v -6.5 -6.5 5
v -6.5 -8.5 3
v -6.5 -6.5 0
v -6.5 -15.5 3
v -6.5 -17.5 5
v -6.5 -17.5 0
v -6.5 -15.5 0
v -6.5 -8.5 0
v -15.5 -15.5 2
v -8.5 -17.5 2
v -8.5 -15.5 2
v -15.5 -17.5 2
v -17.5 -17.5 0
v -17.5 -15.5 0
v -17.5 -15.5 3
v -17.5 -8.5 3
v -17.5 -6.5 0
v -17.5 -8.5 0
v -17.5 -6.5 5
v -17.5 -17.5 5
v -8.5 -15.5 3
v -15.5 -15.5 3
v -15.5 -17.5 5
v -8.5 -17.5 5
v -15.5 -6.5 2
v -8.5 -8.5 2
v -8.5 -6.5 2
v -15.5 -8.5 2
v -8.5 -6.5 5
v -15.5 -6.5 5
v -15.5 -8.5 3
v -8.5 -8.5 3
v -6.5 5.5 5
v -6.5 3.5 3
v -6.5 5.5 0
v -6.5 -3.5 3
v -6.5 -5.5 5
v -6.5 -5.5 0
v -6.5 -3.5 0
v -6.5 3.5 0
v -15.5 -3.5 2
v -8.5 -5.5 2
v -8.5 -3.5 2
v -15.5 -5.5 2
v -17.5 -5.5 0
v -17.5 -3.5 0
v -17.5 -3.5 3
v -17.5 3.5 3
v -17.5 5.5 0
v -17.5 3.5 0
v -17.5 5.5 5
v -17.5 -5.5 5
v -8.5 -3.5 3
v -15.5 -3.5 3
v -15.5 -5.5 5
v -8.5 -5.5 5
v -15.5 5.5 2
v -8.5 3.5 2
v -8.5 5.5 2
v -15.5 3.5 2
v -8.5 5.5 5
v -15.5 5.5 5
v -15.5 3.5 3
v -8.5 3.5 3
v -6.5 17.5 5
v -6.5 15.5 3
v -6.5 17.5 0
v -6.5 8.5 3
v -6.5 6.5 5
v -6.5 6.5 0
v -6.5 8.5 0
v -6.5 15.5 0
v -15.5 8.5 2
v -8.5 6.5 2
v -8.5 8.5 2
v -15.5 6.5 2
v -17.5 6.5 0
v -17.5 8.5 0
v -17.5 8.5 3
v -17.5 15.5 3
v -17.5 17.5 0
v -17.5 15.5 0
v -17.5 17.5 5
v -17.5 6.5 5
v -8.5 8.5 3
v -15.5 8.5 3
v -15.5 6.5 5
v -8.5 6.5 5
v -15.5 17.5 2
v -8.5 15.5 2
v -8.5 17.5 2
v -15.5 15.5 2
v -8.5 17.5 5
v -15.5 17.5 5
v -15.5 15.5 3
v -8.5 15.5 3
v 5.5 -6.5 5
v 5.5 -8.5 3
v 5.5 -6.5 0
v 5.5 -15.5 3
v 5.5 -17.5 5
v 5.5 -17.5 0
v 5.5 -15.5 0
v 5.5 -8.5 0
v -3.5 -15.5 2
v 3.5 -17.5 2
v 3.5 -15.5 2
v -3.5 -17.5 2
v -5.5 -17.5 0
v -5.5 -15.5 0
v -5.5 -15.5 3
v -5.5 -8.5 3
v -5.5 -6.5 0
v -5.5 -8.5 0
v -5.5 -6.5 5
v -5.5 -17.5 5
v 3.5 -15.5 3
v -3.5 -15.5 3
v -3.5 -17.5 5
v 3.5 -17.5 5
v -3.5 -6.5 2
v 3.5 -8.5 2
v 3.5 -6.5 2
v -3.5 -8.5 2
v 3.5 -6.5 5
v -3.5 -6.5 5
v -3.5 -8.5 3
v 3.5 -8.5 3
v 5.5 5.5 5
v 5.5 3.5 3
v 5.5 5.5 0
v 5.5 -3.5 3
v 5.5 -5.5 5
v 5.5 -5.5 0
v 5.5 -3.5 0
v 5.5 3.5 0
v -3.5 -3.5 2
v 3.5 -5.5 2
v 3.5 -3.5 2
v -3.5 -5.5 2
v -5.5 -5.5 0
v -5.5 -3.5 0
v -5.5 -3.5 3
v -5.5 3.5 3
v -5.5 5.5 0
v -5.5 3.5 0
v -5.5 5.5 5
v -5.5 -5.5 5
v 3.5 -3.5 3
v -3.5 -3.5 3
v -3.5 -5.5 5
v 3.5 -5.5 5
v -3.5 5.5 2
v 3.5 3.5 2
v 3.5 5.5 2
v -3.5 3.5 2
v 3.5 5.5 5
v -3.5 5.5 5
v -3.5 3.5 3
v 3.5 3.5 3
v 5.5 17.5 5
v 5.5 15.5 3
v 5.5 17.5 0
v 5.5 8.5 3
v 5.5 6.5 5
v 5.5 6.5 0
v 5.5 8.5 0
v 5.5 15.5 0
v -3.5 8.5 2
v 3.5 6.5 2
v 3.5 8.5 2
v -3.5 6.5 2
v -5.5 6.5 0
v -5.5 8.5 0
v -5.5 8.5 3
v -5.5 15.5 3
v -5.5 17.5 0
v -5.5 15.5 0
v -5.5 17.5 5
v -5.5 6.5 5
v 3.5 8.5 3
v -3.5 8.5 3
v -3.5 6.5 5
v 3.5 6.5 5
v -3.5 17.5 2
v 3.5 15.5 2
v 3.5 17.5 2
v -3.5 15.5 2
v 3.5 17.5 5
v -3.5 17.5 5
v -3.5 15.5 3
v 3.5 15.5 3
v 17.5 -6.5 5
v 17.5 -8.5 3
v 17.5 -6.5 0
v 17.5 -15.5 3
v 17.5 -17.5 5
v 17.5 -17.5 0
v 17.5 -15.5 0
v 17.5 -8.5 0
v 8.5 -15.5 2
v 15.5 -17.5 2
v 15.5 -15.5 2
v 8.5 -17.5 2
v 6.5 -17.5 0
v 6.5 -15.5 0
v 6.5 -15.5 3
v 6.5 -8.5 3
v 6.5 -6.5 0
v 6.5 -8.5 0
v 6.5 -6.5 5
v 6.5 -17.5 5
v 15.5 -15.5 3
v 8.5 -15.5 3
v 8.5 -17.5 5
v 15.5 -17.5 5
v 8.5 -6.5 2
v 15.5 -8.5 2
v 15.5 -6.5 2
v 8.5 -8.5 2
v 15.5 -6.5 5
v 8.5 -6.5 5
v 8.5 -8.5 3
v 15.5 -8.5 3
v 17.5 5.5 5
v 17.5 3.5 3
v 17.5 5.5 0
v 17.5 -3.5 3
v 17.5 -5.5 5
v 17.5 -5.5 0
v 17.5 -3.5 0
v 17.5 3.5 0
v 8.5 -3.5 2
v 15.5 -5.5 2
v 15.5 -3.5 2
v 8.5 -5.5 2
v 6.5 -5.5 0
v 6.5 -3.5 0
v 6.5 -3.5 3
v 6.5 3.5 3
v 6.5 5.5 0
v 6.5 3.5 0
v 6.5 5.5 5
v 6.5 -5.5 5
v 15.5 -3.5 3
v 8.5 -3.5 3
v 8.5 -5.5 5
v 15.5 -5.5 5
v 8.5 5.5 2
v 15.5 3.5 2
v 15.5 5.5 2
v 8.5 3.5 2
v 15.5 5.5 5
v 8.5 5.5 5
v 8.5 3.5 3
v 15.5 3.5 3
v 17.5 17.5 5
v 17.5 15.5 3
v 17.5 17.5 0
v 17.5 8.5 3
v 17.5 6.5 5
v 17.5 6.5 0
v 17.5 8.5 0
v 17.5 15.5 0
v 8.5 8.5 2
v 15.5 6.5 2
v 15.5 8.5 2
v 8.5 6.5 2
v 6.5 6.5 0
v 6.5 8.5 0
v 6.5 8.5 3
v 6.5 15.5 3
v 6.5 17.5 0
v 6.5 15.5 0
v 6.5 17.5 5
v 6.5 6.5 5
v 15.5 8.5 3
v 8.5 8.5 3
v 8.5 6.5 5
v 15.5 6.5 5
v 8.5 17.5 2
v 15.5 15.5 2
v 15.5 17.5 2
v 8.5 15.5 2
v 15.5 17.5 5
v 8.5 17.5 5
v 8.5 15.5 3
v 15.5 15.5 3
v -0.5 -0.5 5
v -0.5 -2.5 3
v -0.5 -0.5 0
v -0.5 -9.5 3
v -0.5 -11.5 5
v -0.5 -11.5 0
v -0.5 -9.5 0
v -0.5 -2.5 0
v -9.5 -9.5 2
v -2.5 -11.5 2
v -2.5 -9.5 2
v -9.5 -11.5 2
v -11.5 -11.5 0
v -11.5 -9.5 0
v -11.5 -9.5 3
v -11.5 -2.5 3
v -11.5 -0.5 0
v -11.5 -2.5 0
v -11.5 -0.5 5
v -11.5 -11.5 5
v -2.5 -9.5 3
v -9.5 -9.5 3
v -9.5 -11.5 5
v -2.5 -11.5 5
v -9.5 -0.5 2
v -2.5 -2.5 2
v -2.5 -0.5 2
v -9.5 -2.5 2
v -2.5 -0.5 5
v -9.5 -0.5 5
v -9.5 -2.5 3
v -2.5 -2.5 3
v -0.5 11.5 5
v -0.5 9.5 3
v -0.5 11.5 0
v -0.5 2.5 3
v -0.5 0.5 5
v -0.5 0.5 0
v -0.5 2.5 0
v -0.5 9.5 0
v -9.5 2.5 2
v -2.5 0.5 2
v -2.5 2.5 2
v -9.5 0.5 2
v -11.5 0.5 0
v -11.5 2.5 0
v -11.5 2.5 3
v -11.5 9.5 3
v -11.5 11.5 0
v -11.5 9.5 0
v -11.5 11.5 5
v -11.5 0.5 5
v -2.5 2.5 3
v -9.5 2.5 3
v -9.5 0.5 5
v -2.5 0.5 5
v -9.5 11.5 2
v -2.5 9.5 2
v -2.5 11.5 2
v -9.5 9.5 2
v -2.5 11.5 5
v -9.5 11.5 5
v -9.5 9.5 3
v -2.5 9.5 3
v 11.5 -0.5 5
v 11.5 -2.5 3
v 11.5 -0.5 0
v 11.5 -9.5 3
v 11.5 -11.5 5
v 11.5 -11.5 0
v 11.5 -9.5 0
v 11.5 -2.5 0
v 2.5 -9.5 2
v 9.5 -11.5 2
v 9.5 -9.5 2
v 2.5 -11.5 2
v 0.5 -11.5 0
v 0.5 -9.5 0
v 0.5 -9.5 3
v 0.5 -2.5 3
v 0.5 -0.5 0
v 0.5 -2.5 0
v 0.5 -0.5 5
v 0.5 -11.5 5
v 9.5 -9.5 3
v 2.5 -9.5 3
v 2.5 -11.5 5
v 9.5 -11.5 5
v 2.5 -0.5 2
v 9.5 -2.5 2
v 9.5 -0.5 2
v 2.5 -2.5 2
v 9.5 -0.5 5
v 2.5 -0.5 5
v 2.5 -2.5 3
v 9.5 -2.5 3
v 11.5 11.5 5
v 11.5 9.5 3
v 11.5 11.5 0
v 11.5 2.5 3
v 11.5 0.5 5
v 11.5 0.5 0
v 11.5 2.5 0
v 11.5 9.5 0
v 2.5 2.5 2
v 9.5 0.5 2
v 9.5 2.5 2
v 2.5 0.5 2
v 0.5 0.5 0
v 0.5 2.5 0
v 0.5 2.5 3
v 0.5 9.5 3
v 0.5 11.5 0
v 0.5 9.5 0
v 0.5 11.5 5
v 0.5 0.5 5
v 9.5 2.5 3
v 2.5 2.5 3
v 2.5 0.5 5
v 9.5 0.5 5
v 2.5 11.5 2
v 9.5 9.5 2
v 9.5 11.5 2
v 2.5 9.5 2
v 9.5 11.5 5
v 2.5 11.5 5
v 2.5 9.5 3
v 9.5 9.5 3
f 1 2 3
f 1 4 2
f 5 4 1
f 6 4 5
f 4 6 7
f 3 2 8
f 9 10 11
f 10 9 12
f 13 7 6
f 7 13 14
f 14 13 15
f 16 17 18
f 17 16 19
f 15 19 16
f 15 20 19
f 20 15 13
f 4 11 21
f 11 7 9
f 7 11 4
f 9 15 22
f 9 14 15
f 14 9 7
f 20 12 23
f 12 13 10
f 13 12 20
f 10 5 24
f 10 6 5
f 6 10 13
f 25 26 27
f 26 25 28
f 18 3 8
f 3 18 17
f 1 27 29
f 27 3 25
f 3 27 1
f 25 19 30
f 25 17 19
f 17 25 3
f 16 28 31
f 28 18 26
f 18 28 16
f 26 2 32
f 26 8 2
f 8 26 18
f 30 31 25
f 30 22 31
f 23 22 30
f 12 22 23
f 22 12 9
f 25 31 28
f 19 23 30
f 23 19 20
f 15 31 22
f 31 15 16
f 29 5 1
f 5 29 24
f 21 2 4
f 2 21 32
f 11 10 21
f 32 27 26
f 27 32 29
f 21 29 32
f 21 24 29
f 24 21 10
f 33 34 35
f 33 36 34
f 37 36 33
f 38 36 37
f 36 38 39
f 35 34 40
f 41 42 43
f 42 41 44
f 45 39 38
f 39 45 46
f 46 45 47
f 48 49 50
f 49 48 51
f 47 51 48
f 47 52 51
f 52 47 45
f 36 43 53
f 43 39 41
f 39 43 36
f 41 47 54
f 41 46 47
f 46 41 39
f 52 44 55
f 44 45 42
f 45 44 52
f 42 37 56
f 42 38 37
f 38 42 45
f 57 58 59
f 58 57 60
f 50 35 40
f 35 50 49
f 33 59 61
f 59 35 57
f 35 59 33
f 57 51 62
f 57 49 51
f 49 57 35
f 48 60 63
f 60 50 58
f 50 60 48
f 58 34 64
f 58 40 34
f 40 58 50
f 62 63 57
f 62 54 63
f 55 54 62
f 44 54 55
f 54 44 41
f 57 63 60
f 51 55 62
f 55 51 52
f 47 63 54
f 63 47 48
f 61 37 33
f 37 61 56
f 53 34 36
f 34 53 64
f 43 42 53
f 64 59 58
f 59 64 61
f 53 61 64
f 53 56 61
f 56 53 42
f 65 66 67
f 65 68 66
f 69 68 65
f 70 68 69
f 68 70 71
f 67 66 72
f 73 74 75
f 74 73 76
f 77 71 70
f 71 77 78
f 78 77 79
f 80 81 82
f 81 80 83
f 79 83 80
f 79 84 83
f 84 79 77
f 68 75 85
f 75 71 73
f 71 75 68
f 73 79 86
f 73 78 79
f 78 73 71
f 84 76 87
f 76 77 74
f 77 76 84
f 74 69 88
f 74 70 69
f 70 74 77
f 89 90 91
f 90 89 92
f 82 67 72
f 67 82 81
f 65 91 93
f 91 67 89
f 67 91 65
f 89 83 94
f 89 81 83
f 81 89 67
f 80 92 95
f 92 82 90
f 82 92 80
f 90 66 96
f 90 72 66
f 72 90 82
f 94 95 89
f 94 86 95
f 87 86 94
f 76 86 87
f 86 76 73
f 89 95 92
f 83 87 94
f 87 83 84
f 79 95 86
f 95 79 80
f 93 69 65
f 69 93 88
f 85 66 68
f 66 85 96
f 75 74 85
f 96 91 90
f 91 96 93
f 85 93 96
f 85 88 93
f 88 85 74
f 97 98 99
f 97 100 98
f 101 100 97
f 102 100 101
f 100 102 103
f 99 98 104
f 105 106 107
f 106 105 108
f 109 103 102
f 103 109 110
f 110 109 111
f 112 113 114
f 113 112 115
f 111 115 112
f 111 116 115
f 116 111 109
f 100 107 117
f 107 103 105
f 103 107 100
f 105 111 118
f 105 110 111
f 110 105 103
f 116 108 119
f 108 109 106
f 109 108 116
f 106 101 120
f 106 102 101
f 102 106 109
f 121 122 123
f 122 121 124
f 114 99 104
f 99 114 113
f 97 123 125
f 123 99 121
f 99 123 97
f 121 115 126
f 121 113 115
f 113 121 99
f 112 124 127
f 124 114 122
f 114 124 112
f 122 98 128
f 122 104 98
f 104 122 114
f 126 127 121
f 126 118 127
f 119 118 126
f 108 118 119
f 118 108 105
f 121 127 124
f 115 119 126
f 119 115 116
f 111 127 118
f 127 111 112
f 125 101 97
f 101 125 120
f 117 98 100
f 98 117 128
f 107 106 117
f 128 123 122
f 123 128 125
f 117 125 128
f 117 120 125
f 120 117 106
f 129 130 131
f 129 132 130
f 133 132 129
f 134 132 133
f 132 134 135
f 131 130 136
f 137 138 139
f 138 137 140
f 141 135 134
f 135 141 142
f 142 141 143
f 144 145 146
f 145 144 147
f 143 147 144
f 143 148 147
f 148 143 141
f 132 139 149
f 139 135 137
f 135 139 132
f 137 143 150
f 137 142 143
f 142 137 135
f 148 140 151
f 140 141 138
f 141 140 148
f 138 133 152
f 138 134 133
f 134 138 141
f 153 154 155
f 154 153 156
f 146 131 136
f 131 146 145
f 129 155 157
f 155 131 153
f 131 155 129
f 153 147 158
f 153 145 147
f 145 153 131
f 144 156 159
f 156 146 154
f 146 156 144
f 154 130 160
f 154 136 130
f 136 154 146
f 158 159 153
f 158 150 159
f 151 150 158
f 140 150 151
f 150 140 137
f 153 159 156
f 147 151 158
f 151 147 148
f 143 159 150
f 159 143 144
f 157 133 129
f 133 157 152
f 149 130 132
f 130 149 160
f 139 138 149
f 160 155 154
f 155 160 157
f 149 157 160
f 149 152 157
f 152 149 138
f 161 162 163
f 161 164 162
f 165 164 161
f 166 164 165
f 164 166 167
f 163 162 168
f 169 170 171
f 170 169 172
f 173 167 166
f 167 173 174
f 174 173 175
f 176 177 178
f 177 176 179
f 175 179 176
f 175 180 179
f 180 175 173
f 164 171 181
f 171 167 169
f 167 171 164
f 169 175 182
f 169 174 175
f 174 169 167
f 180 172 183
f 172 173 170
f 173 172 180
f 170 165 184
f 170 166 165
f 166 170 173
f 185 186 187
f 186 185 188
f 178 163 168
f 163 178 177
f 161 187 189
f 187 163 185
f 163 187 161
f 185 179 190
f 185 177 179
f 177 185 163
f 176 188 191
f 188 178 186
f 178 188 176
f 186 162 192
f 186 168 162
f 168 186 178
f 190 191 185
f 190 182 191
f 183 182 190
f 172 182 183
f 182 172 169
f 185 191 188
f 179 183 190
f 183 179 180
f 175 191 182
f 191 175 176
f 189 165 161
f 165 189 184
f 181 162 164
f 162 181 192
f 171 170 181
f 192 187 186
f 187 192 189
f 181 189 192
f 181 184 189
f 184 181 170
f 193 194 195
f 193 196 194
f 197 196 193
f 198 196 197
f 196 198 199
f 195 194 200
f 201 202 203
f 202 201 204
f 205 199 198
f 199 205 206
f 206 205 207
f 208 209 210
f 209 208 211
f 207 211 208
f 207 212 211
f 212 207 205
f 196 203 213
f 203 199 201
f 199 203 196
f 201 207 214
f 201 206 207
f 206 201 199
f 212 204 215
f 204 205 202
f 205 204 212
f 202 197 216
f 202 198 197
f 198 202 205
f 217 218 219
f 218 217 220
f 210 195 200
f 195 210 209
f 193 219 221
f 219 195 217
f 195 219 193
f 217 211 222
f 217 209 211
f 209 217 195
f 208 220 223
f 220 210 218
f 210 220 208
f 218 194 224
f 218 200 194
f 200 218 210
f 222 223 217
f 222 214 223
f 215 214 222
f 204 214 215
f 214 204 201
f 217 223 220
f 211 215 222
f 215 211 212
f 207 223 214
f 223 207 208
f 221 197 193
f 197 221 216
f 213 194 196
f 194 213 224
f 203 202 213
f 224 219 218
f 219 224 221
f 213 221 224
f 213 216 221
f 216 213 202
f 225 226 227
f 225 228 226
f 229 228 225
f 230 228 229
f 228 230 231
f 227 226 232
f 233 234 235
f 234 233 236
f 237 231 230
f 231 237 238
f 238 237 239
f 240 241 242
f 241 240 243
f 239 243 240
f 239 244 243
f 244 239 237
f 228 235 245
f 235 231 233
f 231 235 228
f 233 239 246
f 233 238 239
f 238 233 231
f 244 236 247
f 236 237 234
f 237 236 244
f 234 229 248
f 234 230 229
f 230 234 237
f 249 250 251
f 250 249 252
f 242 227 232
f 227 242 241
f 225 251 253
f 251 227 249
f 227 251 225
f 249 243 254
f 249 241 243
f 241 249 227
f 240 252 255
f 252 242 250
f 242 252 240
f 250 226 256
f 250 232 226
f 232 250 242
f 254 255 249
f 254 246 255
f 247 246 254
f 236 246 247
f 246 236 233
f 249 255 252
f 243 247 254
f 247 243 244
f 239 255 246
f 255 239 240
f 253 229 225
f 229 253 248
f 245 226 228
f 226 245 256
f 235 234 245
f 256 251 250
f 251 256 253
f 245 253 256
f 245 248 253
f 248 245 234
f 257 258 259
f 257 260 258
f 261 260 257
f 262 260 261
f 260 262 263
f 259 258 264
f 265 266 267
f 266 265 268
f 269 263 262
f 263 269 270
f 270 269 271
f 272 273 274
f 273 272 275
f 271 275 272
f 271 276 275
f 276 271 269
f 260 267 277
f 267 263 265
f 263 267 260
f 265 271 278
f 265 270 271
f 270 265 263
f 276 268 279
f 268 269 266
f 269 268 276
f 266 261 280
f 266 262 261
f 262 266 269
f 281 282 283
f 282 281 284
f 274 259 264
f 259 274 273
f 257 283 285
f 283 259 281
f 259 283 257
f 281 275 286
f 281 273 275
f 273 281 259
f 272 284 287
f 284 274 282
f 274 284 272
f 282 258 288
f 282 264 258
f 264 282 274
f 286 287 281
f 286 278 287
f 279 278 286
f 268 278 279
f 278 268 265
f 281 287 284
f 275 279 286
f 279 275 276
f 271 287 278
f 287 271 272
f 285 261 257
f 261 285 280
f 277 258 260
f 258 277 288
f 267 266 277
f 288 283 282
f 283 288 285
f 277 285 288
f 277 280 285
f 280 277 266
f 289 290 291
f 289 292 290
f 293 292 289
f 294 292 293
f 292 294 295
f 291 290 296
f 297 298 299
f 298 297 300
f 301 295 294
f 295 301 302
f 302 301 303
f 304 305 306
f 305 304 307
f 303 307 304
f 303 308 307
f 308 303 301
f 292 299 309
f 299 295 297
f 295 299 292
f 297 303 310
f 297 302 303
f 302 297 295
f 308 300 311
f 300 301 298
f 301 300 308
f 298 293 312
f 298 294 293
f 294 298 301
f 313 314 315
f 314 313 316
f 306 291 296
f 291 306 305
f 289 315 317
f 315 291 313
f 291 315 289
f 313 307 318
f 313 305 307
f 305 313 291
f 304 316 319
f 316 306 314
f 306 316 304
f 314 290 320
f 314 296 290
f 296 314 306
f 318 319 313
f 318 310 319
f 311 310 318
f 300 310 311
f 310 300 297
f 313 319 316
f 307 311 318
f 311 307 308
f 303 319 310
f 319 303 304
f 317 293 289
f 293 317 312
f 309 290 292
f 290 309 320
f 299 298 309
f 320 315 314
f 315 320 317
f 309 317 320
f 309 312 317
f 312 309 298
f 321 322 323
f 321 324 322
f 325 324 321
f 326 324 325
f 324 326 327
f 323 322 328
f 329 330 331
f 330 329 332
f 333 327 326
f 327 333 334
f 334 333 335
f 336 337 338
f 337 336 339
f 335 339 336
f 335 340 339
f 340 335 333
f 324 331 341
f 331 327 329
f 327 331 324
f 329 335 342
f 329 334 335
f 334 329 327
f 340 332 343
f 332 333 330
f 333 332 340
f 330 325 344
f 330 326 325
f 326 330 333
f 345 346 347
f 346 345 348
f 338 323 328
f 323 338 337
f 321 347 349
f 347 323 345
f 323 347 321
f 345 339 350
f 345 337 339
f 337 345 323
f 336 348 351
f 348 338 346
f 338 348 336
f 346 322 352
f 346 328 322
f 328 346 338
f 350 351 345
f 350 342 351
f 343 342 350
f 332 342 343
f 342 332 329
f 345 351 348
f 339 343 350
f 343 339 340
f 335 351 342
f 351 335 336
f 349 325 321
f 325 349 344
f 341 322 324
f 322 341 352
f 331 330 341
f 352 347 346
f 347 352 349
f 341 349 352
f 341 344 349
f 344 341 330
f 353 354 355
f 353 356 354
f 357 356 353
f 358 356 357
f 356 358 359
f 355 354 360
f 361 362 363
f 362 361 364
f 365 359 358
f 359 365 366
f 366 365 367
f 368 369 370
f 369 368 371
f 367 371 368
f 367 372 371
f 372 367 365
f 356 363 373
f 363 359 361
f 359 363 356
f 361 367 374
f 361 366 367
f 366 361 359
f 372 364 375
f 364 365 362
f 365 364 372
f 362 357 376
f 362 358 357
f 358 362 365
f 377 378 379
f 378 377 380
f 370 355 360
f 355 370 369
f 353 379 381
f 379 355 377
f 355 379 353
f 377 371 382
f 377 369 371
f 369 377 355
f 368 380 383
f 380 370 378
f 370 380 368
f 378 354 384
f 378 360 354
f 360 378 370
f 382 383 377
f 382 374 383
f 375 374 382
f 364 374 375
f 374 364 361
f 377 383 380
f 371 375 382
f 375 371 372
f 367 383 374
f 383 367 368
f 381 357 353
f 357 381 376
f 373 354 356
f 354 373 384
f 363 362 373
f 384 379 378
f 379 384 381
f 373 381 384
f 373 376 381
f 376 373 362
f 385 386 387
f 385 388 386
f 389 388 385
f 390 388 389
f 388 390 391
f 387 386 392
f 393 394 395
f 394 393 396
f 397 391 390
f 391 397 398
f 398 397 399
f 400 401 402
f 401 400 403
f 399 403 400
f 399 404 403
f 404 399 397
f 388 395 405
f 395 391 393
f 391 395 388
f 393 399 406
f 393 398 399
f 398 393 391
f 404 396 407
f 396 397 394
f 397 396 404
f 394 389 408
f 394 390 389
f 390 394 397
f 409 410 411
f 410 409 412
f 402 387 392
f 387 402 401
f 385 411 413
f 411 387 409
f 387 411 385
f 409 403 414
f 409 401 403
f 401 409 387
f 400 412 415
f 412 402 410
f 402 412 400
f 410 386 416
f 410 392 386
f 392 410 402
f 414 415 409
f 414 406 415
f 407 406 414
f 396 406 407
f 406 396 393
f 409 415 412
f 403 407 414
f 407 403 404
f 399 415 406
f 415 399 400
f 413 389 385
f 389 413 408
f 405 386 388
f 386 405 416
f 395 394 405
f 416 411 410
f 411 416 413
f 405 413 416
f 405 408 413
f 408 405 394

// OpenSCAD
$fn = 128;

module link(width, margin) {
    total_length = 4*width+3*margin;
    total_height = 2*width+margin;
    shift_length = 3*width+3*margin;
    shift_height = width+margin;
    union() {
        for (yy=[0,shift_length])
        translate([0,yy,0]) cube([total_length, width, width]);
        
        for (xx=[0,shift_length]) 
        translate([xx,0,shift_height]) cube([width, total_length, width]);
        
        for (xx=[0,shift_length]) for (yy=[0,shift_length])
        translate([xx,yy,0]) cube([width, width, total_height]);
    }
}

module links_grid(width, margin, nn) {
    foo = 4*width+4*margin;
    bar = 2*width+1.5*margin;
    translate([-bar,-bar,0])
    color([1,0,0]) for (ii=[-nn:nn]) for (jj=[-nn:nn])
    {
        translate([foo*ii,foo*jj,0])
        link(width, margin);
    }
    translate([.5*margin,.5*margin,0])
    color([0,0,1]) for (ii=[-nn:nn-1]) for (jj=[-nn:nn-1])
    {
        translate([foo*ii,foo*jj,0])
        link(width, margin);
    }
}

module round_grid(width, margin, nn, ring) {
    radius = nn*4*(width+margin);
    radius_ = radius+ring;
    height = 2*width+margin;
    difference() {
        union() {
            color([1,1,0]) difference() {
                translate([-radius_-1,-radius_-1,0])
                cube([2*radius_+2,2*radius_+2,height]);
                translate([0,0,-1])
                cylinder(h=height+2, r=radius);
            }
            links_grid(width, margin, nn);
        }
        color([1,0,1]) difference() {
            translate([-radius_-2,-radius_-2,-1])
            cube([2*radius_+4,2*radius_+4,height+2]);
            translate([0,0,-1])
            cylinder(h=height+4, r=radius_);
        }
    }
}

//round_grid(3,2,5,15); //version 0
//round_grid(4,2,3,10); //version 1
links_grid(2,1,1);
